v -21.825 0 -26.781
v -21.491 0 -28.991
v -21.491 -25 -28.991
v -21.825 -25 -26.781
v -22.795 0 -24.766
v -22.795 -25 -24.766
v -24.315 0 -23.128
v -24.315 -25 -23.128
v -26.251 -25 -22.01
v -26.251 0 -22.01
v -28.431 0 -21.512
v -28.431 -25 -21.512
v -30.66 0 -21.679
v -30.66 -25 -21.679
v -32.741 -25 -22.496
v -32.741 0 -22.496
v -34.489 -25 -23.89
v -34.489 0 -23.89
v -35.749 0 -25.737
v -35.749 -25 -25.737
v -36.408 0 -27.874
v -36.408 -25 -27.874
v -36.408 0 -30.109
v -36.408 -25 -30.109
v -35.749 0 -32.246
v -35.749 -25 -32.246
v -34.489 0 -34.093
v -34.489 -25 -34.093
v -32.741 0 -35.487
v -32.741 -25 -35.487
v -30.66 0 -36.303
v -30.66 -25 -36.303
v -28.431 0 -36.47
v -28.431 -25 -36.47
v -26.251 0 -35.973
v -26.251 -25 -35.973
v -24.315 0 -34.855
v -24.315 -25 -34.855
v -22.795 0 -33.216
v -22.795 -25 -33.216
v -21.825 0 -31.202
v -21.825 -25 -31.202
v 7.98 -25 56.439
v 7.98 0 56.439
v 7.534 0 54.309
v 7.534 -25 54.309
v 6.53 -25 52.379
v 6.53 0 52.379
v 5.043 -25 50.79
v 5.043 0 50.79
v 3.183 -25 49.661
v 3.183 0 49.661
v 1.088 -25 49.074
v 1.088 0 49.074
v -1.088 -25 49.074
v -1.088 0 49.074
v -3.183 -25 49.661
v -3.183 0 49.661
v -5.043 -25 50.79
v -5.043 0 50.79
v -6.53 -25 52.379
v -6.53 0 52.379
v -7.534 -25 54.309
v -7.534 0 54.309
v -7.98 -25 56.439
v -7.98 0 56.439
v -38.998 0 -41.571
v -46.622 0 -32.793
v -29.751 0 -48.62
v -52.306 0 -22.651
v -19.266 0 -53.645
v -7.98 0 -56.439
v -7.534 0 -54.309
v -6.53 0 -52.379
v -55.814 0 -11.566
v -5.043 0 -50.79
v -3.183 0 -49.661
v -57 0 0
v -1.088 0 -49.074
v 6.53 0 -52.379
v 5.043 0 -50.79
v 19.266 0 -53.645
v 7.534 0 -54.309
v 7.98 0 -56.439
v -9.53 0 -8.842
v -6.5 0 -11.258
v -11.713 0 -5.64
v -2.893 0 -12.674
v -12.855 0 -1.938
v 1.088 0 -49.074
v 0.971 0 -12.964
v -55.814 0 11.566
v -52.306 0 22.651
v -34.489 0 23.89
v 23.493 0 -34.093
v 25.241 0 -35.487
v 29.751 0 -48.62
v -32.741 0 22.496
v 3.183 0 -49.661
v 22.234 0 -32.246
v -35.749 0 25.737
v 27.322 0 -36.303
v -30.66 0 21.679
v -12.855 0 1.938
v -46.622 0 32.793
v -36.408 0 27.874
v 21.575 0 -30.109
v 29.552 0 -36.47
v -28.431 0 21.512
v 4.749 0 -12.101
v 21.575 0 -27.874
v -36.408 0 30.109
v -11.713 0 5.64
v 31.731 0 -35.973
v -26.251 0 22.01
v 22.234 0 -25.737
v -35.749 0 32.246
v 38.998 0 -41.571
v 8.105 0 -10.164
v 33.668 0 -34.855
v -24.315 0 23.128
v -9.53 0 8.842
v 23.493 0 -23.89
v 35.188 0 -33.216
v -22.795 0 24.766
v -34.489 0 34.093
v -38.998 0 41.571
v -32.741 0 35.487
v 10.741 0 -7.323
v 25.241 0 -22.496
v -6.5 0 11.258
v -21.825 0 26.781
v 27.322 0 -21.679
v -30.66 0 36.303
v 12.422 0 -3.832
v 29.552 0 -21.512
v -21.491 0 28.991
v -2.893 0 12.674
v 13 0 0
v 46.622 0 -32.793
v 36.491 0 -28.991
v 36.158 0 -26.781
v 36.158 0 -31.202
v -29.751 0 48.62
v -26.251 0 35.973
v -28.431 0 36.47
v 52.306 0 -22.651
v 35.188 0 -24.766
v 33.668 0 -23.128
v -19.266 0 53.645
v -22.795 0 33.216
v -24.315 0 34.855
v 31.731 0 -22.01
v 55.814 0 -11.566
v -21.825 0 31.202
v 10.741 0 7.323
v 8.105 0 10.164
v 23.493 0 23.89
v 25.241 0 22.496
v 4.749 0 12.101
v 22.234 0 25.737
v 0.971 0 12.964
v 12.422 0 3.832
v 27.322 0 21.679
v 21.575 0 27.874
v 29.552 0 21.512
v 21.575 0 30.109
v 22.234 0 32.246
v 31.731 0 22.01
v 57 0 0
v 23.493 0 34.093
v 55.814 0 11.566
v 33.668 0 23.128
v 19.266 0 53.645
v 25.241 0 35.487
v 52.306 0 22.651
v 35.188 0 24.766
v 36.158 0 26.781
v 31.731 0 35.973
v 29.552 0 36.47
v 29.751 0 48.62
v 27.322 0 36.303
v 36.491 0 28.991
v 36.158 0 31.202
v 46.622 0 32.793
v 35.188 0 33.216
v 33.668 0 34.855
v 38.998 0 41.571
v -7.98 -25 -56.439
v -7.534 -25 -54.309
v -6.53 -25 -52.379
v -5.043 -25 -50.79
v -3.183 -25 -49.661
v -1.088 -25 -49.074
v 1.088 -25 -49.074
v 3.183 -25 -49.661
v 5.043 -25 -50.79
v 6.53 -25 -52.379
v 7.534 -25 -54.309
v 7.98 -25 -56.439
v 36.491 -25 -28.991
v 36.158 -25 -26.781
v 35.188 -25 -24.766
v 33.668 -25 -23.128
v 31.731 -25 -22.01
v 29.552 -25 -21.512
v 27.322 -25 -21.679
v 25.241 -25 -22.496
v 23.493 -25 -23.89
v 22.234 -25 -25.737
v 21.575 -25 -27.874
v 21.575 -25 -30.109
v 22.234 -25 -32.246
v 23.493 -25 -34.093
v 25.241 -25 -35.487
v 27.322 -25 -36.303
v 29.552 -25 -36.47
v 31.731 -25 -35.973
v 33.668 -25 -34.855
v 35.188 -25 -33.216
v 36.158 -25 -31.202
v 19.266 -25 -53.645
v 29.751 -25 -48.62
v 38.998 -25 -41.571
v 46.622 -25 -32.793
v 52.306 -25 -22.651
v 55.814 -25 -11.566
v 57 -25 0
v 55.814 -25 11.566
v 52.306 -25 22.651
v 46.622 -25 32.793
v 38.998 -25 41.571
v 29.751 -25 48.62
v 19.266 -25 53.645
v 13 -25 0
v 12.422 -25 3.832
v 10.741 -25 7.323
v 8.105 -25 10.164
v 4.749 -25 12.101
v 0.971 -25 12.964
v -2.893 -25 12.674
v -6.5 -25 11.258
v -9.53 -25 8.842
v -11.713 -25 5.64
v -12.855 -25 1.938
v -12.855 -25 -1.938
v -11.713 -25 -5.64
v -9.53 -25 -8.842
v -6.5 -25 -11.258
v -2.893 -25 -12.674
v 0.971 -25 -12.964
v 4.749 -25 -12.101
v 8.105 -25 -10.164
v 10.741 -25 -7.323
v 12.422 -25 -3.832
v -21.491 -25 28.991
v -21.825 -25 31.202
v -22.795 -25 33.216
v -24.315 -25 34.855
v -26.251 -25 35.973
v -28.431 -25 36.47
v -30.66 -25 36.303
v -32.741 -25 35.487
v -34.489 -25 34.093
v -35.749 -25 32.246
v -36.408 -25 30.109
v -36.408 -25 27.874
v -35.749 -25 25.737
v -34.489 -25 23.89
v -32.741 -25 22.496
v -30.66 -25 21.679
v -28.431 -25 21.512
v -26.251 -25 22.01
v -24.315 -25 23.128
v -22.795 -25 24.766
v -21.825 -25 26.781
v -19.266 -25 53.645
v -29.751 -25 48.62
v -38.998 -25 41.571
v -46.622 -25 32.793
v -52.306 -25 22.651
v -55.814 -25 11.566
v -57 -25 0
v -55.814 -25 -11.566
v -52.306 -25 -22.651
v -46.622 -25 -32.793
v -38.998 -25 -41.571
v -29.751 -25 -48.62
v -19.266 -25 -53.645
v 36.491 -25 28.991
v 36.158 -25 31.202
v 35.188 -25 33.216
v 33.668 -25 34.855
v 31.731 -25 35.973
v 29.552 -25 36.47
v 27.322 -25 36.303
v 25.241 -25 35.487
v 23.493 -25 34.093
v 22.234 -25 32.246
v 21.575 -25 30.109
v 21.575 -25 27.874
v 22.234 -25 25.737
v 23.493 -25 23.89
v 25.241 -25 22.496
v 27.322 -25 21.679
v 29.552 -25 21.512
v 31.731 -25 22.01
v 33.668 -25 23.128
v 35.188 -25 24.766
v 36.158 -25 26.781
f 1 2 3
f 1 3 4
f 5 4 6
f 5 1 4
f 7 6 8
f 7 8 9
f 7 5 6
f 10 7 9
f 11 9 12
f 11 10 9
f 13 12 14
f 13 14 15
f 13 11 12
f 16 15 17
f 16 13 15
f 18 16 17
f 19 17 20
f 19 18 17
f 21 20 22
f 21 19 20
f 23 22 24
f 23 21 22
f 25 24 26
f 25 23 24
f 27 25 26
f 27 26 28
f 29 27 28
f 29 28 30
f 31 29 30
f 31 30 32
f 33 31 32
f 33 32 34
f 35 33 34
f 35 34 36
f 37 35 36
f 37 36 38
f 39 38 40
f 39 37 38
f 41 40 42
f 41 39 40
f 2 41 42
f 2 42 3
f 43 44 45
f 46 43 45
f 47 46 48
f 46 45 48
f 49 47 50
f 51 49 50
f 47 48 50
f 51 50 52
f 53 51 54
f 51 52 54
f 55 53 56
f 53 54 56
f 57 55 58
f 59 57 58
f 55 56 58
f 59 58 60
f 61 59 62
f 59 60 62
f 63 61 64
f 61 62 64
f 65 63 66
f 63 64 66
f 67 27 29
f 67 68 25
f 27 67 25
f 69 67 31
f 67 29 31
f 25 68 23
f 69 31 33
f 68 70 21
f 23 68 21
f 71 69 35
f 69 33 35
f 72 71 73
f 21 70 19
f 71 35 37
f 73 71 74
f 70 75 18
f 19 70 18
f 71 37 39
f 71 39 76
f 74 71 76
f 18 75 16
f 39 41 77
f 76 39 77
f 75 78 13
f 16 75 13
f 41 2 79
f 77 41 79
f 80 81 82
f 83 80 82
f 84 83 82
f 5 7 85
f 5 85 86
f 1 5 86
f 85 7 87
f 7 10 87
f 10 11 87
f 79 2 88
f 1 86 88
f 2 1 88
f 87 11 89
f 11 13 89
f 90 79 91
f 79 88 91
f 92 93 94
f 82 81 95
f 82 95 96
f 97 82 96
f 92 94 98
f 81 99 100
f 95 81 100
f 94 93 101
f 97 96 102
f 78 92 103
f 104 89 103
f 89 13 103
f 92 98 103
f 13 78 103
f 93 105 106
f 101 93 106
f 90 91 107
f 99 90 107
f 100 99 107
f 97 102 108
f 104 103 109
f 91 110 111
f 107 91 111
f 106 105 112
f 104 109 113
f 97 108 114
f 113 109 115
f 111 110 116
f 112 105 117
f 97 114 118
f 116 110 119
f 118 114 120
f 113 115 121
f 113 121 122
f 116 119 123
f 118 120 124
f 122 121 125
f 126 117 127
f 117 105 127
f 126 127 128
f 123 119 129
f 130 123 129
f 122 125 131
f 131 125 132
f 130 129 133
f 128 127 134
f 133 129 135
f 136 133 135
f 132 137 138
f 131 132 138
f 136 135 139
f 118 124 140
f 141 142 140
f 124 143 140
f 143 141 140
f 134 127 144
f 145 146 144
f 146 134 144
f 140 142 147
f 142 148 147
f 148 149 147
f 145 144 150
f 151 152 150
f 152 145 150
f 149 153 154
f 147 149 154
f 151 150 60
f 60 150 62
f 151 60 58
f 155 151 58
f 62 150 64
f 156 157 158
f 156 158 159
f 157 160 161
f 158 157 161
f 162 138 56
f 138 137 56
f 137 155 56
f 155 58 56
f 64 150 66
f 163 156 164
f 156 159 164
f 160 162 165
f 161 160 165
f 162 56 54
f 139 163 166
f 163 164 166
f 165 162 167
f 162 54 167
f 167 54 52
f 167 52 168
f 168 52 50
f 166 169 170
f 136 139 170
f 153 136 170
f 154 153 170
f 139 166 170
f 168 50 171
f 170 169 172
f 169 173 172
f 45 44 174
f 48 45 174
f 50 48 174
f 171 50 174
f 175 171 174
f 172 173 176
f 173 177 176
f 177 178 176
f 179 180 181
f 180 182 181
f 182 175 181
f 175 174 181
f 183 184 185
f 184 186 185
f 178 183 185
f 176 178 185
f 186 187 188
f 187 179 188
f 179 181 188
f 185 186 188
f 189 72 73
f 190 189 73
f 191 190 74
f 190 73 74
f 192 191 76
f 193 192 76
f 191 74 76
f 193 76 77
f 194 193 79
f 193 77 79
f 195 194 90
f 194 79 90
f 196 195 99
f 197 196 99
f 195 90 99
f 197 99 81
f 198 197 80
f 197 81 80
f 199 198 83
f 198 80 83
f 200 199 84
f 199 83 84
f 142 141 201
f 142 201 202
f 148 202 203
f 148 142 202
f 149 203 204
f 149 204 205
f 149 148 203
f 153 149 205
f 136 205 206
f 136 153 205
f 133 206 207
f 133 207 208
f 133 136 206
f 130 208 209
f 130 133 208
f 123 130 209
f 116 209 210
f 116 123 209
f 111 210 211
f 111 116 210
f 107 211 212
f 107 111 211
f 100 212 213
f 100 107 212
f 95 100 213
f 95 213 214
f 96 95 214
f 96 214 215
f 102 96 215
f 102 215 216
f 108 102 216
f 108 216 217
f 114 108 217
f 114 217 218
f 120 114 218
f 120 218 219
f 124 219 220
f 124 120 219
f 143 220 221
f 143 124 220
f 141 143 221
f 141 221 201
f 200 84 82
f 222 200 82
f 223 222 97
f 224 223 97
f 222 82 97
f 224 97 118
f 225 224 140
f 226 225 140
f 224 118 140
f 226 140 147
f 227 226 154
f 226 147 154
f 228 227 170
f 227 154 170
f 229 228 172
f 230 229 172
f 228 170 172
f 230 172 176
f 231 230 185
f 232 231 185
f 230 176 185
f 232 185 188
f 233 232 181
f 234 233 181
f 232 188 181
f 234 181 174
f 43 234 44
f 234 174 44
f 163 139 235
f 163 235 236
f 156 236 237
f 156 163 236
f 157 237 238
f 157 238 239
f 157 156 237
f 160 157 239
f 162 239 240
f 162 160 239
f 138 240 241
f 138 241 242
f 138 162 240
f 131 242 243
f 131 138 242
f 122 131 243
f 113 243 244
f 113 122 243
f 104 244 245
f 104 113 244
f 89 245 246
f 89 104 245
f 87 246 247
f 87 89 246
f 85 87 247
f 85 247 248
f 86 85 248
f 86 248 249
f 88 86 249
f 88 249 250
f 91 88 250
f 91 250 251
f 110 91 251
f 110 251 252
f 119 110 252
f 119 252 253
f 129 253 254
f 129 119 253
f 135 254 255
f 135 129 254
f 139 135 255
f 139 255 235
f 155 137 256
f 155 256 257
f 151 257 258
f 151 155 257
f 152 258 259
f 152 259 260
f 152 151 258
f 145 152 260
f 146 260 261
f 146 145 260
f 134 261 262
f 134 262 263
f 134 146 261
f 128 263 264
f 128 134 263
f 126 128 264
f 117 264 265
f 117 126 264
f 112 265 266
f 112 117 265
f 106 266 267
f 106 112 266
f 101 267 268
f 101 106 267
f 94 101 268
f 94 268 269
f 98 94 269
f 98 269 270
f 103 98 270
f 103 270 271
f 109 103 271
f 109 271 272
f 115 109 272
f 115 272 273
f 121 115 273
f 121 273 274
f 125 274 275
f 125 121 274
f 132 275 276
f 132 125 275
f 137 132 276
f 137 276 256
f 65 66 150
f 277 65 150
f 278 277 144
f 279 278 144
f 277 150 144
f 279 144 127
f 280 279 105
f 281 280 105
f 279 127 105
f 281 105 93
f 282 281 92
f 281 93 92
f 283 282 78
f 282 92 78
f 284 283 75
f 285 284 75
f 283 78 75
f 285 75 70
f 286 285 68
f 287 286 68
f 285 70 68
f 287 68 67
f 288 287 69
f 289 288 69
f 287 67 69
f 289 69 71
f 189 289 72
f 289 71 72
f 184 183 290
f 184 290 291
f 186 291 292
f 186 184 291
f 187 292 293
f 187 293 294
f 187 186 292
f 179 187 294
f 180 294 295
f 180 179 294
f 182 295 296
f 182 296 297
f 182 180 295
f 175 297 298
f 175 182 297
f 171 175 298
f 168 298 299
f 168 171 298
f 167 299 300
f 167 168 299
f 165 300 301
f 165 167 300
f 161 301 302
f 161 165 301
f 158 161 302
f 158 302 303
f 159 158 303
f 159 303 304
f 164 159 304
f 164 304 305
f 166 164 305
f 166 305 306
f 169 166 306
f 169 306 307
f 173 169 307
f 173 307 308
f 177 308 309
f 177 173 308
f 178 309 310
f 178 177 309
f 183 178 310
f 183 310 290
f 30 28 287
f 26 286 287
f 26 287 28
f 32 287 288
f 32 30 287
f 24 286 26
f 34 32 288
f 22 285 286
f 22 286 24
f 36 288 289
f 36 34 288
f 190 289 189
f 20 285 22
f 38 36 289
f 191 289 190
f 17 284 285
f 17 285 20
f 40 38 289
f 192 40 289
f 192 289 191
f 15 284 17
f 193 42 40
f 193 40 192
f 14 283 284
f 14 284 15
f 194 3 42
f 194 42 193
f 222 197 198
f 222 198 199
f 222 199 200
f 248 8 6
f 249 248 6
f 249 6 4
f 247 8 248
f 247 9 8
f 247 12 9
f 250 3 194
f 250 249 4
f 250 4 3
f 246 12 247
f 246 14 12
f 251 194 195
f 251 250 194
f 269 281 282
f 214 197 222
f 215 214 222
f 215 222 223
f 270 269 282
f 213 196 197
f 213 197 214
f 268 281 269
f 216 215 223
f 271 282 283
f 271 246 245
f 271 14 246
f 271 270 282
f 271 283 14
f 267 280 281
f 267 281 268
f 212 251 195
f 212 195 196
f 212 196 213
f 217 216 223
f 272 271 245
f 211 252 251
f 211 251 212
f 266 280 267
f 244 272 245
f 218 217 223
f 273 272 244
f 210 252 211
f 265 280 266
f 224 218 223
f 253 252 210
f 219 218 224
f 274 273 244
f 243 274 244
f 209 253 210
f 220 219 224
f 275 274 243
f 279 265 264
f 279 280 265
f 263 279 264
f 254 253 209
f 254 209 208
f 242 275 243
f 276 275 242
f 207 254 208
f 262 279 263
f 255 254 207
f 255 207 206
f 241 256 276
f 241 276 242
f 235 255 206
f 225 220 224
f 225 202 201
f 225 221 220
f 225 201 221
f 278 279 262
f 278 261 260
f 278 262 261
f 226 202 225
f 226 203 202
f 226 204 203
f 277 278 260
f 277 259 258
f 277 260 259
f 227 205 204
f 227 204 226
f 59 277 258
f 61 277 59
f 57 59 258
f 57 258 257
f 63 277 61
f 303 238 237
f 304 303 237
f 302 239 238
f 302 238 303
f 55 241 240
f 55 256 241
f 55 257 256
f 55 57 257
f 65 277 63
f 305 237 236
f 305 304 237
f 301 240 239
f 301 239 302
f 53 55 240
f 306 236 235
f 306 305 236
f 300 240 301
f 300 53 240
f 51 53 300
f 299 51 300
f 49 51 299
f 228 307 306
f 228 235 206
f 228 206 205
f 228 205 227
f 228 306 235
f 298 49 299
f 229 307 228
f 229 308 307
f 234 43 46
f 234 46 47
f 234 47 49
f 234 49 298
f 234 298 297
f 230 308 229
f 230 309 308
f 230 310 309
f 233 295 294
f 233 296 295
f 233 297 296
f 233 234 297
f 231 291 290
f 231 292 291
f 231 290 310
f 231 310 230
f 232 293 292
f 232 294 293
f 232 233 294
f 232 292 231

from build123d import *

# Parameters (mm, degrees)
F0_R     = 7.5
F0_R_2   = 25
F0_R_3   = 13
F1_DEPTH = 25


with BuildPart() as f1:
    # F0 (on Front) → F1 (new body)
    with BuildSketch(Plane.XZ):
        with BuildLine():
            ThreePointArc((7.980277, 56.438596), (0, 49), (-7.980277, 56.438596))
            ThreePointArc((-7.980277, 56.438596), (-57, 0), (-7.980277, -56.438596))
            ThreePointArc((-7.980277, -56.438596), (0, -49), (7.980277, -56.438596))
            ThreePointArc((7.980277, -56.438596), (57, 0), (7.980277, 56.438596))
        make_face()
        with Locations((-28.991378, -28.991378)):
            Circle(F0_R, mode=Mode.SUBTRACT)
        with Locations((28.991378, -28.991378)):
            Circle(F0_R, mode=Mode.SUBTRACT)
        Circle(F0_R_2, mode=Mode.SUBTRACT)
        with Locations((-28.991378, 28.991378)):
            Circle(F0_R, mode=Mode.SUBTRACT)
        with Locations((28.991378, 28.991378)):
            Circle(F0_R, mode=Mode.SUBTRACT)
        Circle(F0_R_2)
        Circle(F0_R_3, mode=Mode.SUBTRACT)
    extrude(amount=F1_DEPTH)


solid = f1.part
